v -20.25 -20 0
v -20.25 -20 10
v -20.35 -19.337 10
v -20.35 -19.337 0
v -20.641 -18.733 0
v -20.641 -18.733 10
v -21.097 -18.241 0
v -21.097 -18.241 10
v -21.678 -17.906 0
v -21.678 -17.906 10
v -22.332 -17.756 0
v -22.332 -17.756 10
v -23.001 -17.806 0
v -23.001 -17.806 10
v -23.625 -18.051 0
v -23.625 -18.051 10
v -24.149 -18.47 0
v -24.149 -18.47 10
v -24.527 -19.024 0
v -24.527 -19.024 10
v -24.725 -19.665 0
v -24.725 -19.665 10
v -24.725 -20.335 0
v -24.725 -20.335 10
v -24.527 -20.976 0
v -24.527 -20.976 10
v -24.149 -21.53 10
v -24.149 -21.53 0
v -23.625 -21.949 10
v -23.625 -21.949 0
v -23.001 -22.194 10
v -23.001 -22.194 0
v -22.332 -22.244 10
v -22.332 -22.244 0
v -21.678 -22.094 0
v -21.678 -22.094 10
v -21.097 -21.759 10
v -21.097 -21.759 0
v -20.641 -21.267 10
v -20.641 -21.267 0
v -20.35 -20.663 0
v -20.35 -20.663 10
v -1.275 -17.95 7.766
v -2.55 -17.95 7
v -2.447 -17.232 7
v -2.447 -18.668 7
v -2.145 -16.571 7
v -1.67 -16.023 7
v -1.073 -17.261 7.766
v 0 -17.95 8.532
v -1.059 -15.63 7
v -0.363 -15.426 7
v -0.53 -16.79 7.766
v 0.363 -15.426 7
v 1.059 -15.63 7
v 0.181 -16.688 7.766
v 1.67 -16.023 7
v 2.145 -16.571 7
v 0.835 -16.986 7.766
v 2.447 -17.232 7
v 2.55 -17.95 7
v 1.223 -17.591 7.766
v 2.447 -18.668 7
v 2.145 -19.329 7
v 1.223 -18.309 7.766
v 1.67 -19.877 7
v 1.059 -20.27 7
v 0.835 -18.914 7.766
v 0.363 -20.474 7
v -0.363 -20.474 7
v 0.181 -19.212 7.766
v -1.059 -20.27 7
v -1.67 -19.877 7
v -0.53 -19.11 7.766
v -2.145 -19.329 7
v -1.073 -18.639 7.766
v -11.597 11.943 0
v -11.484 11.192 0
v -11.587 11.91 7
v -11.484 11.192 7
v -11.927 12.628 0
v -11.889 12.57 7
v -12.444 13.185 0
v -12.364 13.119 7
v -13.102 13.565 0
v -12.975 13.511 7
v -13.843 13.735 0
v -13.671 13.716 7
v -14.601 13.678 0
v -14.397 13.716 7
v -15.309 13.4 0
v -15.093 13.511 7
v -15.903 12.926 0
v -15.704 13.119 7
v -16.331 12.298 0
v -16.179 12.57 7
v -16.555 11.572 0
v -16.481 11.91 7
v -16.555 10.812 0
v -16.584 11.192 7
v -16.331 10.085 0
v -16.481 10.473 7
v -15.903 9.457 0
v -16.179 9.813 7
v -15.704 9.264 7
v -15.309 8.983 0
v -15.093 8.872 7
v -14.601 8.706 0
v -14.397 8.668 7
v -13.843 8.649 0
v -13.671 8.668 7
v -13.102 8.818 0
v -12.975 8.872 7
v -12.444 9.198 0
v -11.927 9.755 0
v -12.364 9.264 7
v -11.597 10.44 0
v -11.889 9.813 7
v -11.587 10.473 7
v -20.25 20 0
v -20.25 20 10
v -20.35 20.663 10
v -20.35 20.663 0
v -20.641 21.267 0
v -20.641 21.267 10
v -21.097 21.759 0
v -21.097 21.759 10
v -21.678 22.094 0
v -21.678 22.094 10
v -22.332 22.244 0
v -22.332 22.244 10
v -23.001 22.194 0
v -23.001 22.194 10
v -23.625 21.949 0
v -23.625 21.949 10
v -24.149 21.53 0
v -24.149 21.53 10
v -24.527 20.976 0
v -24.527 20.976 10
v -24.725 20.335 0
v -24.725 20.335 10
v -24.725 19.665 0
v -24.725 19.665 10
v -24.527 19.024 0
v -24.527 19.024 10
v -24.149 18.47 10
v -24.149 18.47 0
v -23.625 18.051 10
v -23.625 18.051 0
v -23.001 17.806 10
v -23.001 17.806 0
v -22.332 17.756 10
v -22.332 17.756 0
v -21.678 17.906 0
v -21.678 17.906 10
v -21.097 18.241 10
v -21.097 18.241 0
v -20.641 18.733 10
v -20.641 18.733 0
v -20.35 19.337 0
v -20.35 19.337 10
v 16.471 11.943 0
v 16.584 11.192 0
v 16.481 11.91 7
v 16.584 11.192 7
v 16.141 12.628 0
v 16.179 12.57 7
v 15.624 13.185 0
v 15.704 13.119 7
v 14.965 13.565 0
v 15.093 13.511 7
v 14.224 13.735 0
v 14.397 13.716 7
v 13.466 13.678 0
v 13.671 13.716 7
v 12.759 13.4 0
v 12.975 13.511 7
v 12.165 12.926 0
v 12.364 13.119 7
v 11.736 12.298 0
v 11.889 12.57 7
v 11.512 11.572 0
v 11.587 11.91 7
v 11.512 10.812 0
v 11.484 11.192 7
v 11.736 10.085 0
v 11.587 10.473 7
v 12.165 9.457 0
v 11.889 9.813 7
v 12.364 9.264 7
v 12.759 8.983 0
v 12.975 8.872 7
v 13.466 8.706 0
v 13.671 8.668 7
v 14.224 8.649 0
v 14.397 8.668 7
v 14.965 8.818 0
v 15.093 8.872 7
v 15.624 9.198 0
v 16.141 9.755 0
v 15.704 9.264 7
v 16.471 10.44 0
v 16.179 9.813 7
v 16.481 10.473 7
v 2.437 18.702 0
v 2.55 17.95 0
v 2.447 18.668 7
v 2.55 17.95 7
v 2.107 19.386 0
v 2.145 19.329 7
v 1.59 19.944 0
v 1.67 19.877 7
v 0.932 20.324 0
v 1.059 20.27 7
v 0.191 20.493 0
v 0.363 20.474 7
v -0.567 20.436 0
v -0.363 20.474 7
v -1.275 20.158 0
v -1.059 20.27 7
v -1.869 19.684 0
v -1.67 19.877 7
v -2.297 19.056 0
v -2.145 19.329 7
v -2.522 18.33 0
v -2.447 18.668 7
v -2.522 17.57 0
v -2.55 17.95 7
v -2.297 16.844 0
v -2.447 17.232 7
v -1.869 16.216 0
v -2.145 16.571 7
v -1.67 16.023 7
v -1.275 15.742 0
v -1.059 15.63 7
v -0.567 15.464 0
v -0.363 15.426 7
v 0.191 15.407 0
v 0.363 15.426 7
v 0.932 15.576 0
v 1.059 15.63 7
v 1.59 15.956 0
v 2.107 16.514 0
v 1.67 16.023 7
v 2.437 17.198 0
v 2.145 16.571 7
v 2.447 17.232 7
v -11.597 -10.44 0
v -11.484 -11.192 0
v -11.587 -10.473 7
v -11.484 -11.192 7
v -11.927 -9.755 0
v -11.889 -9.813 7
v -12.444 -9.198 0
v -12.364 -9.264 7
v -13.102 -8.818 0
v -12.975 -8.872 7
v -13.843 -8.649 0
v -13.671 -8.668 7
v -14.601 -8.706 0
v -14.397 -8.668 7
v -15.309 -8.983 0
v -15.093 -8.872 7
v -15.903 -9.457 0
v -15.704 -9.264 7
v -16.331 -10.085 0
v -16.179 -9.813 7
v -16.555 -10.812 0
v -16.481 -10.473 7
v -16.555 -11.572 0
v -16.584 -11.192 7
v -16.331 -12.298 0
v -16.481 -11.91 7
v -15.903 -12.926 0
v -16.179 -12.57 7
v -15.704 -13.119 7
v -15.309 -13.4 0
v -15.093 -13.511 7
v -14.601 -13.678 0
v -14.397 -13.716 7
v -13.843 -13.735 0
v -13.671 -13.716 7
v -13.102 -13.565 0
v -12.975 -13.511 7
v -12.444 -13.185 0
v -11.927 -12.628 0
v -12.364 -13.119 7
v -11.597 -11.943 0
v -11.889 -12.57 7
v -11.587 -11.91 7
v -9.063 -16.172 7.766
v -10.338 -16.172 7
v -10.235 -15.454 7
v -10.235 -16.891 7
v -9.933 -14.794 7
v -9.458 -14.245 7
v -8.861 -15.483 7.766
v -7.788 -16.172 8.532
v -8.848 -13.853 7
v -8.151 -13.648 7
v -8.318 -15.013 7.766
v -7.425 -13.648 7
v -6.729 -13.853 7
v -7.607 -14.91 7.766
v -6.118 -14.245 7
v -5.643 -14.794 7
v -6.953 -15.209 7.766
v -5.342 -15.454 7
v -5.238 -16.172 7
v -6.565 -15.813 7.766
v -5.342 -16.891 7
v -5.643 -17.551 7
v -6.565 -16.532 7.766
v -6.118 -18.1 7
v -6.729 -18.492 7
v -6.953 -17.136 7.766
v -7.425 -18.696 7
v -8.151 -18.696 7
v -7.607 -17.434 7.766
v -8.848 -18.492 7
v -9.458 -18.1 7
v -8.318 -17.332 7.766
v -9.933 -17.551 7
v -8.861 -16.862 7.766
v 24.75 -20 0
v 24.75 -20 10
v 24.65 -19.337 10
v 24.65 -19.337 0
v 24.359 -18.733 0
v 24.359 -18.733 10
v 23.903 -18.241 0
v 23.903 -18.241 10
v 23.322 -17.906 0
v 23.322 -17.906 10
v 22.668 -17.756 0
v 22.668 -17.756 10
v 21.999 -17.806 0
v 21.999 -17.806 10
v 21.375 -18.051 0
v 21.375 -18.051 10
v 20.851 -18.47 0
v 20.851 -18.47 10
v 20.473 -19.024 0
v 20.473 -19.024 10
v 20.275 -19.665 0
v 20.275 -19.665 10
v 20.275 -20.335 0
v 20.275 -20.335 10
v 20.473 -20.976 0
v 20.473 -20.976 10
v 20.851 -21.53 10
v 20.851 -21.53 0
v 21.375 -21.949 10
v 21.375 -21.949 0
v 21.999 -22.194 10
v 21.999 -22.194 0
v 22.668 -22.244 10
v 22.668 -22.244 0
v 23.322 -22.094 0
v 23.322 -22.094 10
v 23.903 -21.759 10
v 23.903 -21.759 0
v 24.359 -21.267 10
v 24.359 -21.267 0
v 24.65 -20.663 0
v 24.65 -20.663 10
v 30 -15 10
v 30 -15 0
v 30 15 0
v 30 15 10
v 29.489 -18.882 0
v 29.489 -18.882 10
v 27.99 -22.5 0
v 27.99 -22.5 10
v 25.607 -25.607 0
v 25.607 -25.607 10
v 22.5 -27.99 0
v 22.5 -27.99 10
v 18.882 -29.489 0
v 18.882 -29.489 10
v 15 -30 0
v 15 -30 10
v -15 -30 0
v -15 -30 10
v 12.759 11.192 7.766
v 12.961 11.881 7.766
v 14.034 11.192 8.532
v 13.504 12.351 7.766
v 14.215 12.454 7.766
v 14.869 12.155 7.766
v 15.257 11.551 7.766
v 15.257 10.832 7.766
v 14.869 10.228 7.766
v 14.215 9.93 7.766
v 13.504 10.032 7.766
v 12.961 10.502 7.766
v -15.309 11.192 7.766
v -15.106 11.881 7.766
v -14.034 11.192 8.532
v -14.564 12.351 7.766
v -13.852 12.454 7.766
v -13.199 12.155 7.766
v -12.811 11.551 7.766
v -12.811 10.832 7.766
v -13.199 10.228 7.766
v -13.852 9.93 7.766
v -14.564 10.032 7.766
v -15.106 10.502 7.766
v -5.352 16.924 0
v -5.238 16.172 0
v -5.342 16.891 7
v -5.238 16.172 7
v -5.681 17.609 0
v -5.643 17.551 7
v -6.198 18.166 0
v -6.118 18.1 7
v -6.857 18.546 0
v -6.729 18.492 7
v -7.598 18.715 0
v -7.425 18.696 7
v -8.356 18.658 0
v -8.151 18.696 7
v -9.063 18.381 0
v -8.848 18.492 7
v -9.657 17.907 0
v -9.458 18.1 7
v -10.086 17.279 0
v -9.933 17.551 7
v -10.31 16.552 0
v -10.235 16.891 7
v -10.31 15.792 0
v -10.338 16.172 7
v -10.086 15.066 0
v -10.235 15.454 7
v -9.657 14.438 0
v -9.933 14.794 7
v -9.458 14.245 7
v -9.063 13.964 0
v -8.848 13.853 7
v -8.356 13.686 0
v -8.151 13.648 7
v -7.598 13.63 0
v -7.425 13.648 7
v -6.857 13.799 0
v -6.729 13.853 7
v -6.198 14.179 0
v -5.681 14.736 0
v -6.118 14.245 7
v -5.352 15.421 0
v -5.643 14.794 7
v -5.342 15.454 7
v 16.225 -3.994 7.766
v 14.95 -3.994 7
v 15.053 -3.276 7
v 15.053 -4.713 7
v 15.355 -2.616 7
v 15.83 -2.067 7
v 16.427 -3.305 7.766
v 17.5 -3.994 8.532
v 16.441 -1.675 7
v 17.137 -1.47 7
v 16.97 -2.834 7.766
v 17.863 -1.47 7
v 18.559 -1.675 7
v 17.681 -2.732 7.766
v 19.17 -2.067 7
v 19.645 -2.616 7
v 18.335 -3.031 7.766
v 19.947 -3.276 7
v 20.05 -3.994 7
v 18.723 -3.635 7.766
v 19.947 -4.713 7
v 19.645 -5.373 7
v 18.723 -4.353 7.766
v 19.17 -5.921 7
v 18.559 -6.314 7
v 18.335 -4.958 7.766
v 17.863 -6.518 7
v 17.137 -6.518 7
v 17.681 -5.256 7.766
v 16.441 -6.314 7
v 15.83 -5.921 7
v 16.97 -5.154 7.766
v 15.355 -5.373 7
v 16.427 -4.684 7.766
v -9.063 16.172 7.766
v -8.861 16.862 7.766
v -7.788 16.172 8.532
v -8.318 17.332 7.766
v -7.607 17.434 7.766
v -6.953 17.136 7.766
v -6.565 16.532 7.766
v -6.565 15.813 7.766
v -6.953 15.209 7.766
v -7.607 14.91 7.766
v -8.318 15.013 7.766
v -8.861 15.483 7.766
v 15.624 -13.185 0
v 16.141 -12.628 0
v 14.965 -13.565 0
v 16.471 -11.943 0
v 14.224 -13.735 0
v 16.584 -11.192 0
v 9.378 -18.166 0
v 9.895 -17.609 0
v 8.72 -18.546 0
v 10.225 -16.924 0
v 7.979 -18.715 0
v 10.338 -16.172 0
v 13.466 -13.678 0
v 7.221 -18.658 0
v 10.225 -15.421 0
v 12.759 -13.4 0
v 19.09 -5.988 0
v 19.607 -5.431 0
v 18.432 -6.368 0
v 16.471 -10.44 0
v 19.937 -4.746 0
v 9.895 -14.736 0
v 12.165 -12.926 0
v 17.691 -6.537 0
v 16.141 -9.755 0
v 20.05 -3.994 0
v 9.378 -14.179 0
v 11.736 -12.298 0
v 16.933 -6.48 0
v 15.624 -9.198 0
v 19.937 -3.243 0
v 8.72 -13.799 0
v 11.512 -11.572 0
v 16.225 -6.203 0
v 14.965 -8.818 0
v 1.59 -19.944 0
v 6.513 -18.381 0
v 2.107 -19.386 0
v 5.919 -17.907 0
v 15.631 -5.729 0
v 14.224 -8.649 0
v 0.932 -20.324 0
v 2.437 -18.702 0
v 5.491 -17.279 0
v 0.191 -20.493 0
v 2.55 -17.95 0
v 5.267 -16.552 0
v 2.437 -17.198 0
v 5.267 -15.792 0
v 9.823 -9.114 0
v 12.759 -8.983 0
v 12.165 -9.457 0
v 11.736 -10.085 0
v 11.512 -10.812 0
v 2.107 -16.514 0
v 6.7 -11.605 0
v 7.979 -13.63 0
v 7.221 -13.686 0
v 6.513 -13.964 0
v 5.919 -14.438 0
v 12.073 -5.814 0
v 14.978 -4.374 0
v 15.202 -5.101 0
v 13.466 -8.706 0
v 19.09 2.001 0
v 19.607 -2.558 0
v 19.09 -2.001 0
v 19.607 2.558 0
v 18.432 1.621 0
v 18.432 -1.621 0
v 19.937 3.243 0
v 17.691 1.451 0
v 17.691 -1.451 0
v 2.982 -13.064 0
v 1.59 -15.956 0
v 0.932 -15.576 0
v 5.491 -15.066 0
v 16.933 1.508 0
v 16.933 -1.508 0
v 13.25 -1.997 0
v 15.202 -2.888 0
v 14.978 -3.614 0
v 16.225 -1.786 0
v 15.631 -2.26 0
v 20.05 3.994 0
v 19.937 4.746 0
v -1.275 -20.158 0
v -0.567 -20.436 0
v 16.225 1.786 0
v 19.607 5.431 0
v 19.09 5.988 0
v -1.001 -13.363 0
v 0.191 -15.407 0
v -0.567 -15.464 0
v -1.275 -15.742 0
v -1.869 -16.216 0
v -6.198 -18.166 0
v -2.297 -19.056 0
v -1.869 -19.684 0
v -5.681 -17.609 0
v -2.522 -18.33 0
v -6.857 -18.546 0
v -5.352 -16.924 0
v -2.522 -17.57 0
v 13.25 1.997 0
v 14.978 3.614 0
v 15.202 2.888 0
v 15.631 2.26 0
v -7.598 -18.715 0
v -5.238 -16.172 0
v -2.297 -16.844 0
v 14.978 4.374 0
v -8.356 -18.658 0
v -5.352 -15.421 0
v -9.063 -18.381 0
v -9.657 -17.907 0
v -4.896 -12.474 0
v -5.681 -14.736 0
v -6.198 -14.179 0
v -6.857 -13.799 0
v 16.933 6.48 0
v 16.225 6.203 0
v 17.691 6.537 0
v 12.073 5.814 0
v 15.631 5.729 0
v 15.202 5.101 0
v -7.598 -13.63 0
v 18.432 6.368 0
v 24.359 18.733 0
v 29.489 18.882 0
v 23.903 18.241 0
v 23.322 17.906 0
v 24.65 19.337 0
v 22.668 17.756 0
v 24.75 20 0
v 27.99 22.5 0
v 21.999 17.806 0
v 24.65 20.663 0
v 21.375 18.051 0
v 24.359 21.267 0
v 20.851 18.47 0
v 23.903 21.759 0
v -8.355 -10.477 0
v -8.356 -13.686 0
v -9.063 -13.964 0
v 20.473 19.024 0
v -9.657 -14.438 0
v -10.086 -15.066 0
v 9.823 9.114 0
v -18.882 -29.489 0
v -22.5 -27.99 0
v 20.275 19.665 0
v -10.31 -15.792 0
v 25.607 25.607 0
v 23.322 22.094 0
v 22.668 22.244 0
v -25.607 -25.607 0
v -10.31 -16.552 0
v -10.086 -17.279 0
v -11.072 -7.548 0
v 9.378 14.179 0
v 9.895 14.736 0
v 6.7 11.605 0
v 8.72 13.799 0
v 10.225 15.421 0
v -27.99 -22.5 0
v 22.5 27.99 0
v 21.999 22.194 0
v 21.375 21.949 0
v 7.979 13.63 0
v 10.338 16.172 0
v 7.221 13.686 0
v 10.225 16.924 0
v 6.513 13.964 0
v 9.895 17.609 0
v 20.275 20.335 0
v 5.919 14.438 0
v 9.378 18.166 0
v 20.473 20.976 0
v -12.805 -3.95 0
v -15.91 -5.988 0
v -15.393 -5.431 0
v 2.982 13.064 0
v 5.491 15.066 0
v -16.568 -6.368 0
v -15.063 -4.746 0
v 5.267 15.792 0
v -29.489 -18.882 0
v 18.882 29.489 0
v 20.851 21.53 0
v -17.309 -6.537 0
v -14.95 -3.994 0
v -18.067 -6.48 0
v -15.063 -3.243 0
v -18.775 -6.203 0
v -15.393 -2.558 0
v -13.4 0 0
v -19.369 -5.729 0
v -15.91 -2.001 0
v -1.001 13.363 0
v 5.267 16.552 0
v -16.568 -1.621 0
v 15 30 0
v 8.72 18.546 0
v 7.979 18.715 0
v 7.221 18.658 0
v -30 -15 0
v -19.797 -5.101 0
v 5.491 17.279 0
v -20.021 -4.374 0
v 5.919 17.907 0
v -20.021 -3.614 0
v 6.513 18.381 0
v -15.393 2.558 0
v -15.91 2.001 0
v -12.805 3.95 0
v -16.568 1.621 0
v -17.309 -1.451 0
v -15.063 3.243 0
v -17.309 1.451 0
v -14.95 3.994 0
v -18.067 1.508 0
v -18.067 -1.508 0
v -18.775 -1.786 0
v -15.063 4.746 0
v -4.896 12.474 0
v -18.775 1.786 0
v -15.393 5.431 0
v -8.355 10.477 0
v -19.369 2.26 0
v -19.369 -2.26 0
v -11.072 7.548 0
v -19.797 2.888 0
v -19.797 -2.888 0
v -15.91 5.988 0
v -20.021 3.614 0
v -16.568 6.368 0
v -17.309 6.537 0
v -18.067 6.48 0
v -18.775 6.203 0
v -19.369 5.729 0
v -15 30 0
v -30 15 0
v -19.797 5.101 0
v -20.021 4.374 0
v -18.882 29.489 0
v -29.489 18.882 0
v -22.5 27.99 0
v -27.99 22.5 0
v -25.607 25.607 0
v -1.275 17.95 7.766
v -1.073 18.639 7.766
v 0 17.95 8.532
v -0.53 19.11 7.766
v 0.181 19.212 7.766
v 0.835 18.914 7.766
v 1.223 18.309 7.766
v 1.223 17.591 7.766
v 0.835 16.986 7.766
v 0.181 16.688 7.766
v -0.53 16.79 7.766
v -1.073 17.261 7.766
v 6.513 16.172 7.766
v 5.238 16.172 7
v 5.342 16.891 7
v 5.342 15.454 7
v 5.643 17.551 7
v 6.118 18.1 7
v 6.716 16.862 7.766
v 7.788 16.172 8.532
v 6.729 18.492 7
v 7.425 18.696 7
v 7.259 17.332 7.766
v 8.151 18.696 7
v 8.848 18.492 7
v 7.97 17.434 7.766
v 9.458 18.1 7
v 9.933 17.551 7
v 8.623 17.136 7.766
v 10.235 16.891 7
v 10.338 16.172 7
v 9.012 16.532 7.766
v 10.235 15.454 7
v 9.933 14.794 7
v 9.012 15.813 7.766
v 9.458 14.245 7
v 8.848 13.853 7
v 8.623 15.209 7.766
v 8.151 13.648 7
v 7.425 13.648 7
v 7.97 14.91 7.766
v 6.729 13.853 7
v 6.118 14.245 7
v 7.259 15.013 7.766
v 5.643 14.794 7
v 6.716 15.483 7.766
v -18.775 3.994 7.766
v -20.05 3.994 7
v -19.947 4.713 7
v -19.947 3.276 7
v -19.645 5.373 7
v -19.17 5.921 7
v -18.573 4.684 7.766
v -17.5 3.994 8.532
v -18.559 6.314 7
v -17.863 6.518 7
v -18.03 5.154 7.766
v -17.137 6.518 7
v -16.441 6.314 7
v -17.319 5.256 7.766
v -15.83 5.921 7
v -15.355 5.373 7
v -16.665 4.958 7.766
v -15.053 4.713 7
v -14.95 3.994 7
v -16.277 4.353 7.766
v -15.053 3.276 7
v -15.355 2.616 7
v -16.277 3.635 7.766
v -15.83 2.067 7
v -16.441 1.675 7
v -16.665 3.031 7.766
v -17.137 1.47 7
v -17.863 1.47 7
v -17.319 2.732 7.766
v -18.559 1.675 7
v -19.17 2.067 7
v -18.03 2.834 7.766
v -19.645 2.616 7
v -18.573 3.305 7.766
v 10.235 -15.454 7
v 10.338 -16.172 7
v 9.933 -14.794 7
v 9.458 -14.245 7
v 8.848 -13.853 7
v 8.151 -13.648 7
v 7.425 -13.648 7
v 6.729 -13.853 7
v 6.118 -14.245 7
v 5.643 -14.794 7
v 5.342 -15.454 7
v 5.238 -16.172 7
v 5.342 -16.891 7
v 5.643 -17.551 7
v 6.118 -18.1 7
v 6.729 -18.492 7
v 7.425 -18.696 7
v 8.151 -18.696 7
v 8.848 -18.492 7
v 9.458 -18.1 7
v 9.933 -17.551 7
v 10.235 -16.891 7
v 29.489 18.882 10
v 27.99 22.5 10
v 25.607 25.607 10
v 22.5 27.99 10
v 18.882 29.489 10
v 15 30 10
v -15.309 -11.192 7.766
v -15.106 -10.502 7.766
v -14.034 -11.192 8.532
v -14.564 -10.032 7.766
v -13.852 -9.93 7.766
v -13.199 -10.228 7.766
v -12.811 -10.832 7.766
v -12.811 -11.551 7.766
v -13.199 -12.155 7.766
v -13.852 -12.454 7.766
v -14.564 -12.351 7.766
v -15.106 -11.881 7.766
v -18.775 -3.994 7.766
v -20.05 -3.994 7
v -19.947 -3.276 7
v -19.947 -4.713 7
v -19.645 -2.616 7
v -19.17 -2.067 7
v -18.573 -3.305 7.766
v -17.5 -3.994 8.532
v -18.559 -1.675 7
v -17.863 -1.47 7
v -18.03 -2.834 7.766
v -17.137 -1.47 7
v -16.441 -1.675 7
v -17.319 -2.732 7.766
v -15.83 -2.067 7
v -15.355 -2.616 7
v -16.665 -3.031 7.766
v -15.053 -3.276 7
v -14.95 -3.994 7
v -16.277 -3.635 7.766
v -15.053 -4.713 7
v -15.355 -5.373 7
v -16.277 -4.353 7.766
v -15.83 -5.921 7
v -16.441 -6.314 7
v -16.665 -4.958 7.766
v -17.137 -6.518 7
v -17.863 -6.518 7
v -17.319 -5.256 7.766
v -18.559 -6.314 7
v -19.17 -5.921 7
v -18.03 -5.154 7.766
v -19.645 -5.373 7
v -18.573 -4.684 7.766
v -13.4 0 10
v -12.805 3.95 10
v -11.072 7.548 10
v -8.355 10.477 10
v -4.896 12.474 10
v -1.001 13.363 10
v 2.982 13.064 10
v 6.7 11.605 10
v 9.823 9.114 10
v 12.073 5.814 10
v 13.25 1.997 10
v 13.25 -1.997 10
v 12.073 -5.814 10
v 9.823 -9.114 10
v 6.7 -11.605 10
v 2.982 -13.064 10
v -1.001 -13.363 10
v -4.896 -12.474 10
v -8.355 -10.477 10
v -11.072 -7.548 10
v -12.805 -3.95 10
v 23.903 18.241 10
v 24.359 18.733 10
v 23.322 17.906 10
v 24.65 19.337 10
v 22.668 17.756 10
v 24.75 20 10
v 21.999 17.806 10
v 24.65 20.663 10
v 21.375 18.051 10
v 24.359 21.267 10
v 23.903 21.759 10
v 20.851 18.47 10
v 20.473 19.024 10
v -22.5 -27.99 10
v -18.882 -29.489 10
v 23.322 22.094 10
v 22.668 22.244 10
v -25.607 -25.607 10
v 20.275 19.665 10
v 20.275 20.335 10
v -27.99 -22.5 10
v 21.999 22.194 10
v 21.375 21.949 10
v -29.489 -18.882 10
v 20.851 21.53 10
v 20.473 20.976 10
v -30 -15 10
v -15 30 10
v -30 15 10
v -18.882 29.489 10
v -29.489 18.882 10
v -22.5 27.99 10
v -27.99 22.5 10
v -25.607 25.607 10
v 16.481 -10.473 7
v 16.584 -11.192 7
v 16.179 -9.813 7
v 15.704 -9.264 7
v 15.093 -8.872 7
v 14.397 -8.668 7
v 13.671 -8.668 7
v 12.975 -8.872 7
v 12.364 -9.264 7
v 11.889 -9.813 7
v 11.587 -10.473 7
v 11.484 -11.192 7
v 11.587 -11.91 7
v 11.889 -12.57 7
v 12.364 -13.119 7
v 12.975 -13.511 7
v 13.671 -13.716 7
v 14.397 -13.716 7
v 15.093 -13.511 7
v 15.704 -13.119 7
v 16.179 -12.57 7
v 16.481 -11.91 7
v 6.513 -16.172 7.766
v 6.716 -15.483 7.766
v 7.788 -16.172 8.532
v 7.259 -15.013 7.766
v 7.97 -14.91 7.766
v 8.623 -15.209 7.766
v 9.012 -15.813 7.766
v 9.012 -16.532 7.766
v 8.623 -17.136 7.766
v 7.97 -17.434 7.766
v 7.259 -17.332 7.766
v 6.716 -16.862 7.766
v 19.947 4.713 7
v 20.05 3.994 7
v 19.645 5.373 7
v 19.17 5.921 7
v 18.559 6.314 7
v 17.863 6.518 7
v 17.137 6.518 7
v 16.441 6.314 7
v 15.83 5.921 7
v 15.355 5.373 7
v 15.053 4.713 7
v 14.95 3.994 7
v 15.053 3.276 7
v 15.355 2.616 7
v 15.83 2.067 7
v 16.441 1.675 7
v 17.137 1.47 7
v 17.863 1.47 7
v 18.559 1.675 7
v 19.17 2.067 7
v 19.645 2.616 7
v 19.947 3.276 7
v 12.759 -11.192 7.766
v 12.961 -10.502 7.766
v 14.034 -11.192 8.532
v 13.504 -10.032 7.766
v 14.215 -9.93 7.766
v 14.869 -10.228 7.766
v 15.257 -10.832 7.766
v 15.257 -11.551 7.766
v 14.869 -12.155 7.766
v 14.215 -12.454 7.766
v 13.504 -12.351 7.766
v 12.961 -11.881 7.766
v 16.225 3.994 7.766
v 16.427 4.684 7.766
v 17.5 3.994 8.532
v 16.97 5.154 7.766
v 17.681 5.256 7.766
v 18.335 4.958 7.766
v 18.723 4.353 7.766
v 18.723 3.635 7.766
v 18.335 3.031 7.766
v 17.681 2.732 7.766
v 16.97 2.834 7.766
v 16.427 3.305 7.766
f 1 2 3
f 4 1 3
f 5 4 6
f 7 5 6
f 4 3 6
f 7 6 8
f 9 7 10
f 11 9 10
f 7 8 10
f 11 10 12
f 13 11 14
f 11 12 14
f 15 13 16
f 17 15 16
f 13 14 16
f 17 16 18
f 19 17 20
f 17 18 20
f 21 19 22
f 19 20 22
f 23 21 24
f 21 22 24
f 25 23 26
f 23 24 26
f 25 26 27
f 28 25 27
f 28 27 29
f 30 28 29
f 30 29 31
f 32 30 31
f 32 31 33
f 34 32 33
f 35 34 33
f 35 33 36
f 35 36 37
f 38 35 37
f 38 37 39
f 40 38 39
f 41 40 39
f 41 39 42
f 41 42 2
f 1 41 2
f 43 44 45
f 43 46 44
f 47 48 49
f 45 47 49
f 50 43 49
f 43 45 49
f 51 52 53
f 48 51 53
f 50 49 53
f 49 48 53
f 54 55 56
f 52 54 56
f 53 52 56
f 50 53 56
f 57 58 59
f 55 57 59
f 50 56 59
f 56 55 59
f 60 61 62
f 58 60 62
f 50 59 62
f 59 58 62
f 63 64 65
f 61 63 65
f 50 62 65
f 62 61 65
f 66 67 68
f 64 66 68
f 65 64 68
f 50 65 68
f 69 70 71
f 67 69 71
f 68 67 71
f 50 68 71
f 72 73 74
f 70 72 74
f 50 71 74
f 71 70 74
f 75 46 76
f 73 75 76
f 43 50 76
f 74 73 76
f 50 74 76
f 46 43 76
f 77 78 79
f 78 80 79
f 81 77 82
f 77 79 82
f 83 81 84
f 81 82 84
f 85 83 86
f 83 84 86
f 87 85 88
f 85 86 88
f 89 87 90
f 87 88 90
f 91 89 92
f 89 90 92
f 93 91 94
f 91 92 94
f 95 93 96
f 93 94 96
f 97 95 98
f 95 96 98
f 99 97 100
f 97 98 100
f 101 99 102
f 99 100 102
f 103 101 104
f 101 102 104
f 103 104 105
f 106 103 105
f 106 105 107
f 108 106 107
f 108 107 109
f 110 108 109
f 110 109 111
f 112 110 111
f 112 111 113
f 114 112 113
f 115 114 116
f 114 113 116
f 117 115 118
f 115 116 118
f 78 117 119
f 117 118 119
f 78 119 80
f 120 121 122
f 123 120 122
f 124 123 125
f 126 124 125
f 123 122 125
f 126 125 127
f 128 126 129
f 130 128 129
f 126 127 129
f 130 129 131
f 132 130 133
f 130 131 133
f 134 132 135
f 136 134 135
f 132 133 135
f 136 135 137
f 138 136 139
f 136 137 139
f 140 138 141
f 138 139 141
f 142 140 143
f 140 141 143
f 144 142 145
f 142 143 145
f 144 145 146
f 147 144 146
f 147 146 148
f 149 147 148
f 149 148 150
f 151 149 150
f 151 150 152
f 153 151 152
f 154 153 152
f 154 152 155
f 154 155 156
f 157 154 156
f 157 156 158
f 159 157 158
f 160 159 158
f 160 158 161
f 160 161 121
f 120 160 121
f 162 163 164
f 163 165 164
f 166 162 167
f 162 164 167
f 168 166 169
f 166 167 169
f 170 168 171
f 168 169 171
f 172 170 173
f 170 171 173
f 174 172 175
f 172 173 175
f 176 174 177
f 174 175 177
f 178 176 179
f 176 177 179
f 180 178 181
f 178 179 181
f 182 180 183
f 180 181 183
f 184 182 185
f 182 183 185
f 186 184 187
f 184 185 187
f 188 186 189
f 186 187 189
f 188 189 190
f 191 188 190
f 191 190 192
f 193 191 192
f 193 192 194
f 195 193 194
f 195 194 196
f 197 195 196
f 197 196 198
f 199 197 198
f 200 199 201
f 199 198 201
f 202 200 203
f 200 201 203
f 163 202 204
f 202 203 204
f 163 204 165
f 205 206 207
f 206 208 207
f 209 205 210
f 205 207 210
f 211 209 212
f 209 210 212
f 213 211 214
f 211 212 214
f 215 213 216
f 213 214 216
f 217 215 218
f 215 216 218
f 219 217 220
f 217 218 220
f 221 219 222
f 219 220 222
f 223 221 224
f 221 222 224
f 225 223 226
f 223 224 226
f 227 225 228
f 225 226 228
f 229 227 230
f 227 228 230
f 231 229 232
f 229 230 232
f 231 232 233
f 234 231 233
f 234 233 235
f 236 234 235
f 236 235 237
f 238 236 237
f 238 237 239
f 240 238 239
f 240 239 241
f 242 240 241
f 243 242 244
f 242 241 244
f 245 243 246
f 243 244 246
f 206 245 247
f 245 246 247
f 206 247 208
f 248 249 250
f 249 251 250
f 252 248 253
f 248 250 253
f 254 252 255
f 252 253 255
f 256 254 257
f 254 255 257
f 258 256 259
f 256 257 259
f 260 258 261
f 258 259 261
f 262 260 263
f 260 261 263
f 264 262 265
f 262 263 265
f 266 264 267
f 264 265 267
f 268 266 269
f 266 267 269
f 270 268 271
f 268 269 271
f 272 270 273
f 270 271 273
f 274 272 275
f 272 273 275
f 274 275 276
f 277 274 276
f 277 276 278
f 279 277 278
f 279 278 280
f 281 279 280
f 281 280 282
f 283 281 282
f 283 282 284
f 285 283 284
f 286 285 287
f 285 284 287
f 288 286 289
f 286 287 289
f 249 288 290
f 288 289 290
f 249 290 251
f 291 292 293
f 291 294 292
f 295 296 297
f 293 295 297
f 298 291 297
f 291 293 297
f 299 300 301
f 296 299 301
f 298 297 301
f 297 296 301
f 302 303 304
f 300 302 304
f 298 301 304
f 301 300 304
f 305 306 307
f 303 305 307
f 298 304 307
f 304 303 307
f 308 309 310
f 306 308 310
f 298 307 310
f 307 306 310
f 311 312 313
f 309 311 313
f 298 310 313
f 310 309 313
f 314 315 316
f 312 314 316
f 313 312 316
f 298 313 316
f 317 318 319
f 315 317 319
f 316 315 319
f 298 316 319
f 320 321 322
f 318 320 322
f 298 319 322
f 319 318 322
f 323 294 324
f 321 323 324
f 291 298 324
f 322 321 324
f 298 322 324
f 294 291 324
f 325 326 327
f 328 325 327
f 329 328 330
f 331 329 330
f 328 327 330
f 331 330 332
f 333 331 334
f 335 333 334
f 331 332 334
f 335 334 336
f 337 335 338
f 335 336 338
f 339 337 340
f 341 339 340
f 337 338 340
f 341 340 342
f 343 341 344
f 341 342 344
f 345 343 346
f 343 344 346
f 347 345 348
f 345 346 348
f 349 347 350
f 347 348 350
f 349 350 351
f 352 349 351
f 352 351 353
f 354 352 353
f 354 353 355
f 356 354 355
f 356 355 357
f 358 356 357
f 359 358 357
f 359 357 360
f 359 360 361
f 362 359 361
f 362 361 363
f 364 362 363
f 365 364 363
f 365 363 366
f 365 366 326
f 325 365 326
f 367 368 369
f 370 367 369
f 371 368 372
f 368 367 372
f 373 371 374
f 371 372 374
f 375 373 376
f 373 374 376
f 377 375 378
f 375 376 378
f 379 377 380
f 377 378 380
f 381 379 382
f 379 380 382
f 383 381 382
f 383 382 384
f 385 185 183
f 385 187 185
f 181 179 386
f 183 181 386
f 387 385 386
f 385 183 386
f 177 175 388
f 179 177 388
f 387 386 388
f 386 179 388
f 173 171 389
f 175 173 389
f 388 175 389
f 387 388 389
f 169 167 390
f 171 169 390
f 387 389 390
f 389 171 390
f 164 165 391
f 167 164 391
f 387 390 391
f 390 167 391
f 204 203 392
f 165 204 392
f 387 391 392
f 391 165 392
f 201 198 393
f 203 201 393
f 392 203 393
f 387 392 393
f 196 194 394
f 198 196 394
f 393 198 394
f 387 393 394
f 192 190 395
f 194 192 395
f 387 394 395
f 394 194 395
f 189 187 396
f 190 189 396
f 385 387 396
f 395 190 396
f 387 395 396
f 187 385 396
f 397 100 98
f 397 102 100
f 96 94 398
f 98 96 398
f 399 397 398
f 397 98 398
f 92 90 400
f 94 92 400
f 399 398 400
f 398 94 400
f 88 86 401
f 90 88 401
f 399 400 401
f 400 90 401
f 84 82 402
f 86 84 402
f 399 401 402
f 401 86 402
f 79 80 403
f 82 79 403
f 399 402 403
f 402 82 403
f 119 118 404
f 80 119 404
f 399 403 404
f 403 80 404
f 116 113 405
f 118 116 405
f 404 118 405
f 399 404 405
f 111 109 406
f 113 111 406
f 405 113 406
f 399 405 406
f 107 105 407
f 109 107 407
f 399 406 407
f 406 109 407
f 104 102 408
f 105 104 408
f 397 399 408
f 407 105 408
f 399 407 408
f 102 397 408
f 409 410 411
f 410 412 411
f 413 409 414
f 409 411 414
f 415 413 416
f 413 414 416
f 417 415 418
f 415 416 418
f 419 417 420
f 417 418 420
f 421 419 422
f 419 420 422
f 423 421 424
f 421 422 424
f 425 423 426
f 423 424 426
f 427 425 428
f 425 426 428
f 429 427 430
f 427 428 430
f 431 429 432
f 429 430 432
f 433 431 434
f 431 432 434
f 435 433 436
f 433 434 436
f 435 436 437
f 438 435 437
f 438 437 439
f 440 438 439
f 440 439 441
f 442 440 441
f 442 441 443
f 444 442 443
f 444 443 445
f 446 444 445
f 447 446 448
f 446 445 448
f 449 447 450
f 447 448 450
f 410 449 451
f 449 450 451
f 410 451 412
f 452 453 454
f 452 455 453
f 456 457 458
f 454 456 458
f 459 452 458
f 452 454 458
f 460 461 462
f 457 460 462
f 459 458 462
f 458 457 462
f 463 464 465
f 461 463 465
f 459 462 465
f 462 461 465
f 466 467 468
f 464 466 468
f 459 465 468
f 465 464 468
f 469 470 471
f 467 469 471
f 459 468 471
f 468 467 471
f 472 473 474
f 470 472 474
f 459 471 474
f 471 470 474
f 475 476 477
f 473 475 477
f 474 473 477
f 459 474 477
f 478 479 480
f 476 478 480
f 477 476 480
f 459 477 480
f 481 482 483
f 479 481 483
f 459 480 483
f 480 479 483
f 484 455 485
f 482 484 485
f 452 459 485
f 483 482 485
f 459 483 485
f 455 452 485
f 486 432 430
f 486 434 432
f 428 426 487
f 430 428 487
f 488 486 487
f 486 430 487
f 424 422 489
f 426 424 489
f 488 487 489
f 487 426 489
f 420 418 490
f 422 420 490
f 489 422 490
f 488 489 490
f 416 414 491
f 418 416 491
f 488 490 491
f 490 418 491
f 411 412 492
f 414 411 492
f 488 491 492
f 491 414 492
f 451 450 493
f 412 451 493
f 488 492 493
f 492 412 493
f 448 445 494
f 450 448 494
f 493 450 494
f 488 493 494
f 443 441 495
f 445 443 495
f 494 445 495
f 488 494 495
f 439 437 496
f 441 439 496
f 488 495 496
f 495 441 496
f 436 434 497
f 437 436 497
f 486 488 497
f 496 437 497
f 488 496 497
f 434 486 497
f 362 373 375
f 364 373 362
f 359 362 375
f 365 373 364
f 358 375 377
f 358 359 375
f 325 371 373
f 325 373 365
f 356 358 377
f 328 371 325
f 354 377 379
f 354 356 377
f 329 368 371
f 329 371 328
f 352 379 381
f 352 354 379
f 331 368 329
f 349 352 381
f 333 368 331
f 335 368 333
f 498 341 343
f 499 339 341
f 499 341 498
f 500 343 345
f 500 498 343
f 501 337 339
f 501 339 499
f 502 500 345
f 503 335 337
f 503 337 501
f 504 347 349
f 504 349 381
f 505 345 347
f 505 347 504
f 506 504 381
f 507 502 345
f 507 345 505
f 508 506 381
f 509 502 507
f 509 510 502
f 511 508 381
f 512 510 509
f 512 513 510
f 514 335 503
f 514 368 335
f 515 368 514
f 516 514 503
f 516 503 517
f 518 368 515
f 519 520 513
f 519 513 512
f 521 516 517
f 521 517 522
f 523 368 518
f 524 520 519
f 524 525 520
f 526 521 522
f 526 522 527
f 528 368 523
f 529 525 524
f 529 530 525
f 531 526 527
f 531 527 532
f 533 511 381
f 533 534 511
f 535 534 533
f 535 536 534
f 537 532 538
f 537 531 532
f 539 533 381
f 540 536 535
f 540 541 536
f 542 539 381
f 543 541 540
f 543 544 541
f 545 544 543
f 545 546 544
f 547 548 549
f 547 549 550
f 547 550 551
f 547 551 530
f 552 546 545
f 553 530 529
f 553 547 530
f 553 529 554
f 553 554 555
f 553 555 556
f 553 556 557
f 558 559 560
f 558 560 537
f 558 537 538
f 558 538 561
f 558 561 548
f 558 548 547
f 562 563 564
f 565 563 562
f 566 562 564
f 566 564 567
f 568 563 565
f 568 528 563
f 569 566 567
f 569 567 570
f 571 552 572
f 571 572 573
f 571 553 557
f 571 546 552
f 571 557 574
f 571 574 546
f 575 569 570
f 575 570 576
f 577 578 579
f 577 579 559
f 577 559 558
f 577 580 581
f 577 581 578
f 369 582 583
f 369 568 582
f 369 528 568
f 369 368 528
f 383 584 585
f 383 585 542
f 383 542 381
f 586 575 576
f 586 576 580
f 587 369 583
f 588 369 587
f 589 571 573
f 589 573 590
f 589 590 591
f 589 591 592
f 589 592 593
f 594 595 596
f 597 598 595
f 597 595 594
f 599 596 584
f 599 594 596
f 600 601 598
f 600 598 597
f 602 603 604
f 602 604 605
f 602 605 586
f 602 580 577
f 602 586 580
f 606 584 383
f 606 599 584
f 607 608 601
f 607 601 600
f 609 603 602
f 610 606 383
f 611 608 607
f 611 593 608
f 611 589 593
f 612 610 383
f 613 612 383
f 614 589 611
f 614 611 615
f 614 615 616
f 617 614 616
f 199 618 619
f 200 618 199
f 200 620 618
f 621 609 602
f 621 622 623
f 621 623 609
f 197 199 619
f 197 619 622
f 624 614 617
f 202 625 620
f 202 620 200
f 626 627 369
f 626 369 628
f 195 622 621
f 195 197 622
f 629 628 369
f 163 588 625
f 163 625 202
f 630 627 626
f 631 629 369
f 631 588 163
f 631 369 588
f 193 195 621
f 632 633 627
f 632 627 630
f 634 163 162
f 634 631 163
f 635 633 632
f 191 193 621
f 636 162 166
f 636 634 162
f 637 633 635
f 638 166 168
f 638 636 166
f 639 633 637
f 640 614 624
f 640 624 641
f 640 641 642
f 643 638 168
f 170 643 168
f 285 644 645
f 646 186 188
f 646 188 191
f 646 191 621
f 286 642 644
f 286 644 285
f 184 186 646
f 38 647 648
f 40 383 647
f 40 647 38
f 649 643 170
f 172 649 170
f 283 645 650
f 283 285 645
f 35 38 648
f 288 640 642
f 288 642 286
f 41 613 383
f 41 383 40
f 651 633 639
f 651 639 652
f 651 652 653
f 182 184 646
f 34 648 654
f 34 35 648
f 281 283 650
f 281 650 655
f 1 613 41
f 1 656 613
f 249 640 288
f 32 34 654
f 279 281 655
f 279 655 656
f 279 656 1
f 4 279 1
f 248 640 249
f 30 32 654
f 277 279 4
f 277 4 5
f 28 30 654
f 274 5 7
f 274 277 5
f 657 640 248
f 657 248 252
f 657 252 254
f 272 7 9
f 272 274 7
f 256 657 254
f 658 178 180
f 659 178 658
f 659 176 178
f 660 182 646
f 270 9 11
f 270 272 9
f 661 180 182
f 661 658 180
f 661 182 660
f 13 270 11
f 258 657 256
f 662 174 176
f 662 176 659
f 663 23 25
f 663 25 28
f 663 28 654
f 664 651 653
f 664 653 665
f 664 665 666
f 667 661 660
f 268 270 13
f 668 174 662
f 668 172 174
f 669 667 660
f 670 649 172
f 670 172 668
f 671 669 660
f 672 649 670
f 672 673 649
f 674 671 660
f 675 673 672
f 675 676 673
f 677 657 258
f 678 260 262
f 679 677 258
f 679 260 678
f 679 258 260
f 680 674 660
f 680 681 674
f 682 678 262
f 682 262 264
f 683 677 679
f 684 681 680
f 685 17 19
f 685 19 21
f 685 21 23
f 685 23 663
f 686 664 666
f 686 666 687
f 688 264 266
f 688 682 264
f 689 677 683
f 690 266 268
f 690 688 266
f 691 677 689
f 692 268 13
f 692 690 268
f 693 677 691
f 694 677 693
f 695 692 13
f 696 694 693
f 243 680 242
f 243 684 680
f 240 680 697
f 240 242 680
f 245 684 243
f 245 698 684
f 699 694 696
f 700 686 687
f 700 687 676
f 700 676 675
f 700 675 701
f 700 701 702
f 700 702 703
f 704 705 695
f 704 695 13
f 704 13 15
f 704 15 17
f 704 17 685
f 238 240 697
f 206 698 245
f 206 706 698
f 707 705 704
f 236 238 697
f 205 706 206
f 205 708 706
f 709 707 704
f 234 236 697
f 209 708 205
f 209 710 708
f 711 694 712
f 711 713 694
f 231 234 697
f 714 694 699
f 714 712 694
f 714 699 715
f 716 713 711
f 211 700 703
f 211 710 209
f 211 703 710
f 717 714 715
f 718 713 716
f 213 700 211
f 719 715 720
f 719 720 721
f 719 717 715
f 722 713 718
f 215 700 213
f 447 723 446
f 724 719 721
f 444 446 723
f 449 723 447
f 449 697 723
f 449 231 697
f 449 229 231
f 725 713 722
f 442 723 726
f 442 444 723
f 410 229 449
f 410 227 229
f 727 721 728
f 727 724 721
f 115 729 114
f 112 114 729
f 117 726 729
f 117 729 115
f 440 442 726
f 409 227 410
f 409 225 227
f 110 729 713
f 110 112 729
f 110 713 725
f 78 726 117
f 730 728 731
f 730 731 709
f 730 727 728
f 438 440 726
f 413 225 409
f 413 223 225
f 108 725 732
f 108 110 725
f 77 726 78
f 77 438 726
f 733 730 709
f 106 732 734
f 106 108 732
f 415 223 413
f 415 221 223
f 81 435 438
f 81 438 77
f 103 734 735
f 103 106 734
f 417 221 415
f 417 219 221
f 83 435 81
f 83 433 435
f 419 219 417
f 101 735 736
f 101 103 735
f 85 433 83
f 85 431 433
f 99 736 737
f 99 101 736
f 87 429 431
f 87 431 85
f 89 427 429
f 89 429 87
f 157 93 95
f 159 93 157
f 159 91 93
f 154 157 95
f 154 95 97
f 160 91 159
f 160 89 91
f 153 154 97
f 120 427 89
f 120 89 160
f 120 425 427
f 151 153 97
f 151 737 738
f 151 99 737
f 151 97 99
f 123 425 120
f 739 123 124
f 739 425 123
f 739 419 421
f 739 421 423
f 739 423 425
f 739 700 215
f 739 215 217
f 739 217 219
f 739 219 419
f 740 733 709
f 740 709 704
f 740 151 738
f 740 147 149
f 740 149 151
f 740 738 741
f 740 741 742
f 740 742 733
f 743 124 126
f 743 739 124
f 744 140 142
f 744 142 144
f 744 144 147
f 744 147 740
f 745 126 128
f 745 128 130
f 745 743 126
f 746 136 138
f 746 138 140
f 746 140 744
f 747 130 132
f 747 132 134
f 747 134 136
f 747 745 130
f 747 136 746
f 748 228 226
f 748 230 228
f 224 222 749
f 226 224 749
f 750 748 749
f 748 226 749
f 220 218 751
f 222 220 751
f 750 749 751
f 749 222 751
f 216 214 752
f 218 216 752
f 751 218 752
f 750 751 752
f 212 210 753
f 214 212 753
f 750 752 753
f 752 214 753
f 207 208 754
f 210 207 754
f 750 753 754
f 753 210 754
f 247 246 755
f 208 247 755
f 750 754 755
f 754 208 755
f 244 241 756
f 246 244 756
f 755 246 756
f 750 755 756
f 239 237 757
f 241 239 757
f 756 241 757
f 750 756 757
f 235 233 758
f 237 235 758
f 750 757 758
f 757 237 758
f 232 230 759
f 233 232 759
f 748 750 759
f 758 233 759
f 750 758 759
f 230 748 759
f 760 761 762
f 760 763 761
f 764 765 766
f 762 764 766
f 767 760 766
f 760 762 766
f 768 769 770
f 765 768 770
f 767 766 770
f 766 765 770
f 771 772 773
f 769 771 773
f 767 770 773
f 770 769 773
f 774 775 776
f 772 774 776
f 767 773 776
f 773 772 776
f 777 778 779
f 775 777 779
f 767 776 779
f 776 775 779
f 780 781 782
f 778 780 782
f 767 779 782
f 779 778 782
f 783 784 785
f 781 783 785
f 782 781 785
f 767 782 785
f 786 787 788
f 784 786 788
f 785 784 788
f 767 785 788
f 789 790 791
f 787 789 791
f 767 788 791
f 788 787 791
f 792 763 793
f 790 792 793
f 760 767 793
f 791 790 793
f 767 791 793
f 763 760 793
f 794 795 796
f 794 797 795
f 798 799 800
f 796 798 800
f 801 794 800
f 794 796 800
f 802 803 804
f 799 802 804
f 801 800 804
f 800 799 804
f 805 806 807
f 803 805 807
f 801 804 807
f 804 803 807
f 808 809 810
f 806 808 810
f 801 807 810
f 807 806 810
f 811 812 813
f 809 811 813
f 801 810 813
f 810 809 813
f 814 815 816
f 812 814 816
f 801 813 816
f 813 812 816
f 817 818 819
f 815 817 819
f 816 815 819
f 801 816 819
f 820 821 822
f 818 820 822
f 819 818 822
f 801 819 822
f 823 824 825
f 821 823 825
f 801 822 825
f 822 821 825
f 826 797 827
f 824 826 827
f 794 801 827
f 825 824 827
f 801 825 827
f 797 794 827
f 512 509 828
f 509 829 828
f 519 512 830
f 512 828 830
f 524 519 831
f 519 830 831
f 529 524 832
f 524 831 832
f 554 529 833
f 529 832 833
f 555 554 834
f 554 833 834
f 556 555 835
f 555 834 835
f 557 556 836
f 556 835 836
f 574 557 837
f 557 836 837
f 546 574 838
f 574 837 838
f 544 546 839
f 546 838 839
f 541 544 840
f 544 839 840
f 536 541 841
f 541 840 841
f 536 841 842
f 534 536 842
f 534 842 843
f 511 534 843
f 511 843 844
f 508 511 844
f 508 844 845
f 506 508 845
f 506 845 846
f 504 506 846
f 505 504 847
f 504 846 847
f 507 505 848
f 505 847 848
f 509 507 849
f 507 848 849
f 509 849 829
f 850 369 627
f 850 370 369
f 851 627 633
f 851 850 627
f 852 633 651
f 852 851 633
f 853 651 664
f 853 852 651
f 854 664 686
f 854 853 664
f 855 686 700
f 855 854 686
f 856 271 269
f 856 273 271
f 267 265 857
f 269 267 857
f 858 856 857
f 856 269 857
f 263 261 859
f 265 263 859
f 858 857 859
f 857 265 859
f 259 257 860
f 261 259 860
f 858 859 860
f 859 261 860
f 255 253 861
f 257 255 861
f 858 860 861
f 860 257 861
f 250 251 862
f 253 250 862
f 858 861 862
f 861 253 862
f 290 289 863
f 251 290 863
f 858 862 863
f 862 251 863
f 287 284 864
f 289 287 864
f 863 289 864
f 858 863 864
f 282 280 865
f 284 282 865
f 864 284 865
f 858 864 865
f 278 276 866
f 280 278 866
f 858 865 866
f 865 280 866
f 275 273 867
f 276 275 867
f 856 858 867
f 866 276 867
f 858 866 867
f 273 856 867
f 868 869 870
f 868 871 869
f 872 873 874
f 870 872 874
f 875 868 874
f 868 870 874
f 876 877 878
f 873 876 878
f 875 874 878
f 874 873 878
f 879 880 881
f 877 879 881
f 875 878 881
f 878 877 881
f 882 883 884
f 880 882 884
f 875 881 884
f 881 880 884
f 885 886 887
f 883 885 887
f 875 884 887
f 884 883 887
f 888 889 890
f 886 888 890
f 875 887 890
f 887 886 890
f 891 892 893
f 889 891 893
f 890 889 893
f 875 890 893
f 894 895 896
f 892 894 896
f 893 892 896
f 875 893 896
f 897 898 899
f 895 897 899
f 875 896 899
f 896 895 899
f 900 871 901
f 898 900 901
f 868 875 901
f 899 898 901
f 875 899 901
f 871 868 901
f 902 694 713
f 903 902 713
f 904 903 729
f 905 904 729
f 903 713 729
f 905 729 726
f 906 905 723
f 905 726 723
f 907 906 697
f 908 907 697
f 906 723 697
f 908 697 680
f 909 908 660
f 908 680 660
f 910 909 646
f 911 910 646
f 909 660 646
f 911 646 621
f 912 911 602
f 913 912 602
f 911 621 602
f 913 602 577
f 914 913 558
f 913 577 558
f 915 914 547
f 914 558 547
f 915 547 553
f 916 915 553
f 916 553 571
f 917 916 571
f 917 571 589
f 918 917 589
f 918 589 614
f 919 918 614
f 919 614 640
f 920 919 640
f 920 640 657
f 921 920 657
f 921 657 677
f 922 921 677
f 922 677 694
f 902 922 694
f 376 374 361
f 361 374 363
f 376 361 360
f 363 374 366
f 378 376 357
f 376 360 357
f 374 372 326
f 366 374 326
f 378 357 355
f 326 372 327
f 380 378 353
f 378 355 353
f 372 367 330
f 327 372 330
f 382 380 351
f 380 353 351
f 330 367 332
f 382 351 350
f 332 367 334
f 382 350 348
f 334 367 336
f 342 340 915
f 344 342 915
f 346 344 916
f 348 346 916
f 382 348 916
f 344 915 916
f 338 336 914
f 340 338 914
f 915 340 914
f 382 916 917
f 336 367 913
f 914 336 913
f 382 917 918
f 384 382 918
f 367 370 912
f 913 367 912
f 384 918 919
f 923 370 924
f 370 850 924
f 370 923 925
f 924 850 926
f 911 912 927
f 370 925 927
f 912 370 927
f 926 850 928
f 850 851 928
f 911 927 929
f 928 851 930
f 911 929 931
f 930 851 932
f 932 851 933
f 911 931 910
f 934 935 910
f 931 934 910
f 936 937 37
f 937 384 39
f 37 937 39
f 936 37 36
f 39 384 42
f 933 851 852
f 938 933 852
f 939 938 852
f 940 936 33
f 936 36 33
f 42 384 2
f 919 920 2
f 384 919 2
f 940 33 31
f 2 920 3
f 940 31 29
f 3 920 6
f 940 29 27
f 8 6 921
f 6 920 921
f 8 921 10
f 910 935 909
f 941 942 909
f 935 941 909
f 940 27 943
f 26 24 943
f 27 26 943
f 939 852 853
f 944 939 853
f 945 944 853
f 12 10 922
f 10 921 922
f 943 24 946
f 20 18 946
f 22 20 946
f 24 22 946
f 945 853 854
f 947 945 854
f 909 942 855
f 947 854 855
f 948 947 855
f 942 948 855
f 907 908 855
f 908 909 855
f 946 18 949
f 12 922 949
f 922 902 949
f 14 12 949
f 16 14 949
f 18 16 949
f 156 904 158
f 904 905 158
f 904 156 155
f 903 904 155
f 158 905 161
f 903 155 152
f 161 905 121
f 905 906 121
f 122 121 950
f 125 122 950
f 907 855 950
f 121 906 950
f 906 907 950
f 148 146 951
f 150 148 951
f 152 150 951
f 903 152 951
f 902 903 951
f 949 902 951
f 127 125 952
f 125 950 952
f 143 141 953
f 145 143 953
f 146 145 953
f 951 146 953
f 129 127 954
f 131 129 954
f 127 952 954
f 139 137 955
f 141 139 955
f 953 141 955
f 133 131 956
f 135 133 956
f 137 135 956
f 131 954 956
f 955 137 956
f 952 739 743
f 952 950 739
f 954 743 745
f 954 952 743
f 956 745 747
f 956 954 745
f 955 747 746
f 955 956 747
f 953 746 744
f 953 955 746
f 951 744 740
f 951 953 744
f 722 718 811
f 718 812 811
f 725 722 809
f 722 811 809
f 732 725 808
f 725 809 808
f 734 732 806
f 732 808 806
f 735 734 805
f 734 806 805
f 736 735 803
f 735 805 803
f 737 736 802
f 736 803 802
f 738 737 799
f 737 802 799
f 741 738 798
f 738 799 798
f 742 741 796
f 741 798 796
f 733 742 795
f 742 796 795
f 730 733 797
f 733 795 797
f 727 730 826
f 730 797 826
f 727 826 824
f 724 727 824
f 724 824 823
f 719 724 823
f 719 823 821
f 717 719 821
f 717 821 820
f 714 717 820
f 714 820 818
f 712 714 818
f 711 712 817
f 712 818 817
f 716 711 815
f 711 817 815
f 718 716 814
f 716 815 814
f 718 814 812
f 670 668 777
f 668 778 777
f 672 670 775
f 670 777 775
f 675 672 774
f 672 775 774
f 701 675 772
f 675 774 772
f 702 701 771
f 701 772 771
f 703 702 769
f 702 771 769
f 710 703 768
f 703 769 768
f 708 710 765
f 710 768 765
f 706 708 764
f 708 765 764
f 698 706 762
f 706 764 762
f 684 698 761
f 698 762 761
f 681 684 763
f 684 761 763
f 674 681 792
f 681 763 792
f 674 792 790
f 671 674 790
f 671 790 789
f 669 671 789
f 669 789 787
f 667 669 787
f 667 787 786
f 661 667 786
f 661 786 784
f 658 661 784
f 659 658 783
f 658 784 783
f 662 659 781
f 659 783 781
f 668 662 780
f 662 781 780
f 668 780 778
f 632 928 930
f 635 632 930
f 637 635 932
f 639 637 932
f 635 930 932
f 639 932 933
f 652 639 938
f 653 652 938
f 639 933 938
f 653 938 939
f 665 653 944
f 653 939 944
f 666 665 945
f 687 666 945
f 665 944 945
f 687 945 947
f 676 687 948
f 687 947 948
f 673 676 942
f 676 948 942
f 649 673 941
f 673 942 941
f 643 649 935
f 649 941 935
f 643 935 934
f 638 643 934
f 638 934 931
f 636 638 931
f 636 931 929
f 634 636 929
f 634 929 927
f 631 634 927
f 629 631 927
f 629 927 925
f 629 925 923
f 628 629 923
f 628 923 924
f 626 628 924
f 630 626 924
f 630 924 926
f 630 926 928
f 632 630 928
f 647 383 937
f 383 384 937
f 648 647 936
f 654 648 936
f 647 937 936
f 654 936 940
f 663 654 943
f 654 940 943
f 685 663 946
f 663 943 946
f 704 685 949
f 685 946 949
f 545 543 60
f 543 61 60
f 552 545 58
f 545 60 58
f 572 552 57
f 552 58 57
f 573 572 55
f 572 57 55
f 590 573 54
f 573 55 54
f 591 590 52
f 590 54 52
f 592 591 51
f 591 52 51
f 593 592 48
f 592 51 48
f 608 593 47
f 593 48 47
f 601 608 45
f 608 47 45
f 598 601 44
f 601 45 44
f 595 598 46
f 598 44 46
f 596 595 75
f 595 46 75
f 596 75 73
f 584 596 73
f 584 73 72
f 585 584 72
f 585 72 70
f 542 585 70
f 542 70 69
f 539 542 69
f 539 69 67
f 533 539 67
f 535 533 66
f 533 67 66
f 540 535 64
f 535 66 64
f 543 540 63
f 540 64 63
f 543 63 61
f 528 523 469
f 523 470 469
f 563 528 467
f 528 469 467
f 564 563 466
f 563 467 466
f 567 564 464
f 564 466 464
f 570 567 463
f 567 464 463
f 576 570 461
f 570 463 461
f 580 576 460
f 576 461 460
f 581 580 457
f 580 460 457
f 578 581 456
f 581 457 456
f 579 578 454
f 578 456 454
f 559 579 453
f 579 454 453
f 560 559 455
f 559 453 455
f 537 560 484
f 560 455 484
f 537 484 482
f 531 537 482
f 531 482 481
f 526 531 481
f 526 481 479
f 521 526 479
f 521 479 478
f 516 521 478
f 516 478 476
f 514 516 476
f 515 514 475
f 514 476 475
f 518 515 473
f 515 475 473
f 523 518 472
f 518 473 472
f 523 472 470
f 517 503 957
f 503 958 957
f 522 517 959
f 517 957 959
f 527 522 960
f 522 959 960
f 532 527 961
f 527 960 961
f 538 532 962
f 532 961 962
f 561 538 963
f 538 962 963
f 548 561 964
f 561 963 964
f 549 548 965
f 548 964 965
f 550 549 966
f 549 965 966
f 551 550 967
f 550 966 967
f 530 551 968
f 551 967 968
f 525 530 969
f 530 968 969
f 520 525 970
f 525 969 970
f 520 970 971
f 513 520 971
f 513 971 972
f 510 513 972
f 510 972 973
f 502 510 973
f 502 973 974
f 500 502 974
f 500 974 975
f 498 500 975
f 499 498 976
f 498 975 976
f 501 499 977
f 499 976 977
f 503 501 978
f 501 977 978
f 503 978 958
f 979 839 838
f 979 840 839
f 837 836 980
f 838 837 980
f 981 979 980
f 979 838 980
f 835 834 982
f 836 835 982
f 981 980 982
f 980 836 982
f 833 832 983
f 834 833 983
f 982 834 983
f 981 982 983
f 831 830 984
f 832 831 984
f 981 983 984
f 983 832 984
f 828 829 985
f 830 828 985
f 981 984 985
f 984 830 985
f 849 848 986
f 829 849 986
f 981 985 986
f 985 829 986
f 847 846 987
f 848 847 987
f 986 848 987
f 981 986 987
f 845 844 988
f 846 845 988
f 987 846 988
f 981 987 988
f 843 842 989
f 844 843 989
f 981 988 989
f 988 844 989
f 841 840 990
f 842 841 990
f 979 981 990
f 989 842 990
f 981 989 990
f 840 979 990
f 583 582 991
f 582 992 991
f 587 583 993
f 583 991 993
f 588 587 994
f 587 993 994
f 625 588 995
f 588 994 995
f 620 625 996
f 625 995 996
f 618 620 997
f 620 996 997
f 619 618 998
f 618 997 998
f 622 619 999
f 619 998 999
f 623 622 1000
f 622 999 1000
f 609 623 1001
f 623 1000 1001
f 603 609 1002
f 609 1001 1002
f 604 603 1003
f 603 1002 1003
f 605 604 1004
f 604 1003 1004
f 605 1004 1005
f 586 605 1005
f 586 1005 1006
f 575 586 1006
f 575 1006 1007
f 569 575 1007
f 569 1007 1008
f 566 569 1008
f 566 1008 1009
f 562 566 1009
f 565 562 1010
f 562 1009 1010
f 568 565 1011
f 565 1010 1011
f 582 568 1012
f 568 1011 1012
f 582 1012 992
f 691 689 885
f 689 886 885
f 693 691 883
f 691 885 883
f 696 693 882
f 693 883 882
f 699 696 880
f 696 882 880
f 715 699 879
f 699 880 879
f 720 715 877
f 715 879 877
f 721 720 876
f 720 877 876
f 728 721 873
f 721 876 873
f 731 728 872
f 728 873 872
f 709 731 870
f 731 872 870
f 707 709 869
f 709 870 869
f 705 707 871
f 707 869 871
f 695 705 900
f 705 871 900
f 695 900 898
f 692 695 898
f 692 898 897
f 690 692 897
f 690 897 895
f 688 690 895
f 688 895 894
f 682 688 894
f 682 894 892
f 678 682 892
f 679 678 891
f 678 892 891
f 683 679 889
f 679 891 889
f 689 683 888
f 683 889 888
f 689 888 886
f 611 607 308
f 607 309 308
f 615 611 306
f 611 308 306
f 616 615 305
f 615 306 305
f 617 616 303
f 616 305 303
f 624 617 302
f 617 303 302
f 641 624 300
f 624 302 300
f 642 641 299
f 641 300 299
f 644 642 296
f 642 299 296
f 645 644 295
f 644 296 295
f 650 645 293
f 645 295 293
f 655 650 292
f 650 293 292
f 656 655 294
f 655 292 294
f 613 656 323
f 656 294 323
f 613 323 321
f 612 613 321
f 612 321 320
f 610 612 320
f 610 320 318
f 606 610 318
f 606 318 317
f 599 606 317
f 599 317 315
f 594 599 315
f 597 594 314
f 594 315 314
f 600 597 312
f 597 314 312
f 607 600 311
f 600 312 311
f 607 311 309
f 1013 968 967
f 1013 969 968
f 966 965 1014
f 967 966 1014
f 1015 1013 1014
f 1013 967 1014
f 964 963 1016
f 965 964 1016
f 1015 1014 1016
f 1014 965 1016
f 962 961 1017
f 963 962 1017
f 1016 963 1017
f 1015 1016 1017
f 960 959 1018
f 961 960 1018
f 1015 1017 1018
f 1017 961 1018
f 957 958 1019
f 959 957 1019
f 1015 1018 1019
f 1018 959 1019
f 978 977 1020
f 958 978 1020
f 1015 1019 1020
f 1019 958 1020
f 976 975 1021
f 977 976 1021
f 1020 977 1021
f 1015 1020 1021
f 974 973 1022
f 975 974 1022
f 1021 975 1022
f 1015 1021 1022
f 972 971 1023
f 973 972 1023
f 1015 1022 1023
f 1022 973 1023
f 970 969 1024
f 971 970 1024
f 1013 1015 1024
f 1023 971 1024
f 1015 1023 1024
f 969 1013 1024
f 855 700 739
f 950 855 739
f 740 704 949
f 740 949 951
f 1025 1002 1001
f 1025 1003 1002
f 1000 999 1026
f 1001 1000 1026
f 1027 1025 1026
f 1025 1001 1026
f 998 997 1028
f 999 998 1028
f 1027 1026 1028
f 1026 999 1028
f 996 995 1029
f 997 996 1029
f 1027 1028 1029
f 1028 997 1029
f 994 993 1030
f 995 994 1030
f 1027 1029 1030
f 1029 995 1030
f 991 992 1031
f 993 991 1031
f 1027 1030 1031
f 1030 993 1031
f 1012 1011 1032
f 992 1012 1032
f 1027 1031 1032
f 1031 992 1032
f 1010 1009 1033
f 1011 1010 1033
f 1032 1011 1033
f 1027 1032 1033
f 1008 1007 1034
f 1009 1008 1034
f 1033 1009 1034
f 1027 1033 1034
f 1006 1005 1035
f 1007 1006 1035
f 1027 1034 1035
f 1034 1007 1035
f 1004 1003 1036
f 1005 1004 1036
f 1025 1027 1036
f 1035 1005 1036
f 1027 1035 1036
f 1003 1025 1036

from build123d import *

# Parameters (mm, degrees)
ESQUISSE1_W                         = 60
ESQUISSE1_H                         = 60
BOSS_EXTRU_1_DEPTH                  = 10
DIAM_TRE_DU_PER_AGE_4_5_4_5_1_D     = 4.5
DIAM_TRE_DU_PER_AGE_5_1_5_1_1_D     = 5.1
DIAM_TRE_DU_PER_AGE_5_1_5_1_1_DEPTH = 7
DIAM_TRE_DU_PER_AGE_5_1_5_1_1_TIP   = 1.532194579
ESQUISSE9_R                         = 13.4
ENL_V_MAT_EXTRU_2_DEPTH             = 44.588989435
CONG_3_R                            = 15


with BuildPart() as part:
    # Esquisse1 → Boss.-Extru.1 (new body)
    with BuildSketch(Plane(origin=(0, 0, 0), x_dir=(-1, 0, 0), z_dir=(0, 0, -1))):
        Rectangle(ESQUISSE1_W, ESQUISSE1_H)
    extrude(amount=-BOSS_EXTRU_1_DEPTH)

    # Diamètre du perçage Ø4.5 (4.5)1 (through all)
    with Locations(Plane(origin=(0, 0, 0), x_dir=(-1, 0, 0), z_dir=(0, 0, -1))):
        with Locations((22.5, 20), (-22.5, 20), (-22.5, -20), (22.5, -20)):
            Hole(DIAM_TRE_DU_PER_AGE_4_5_4_5_1_D / 2)

    # Diamètre du perçage Ø5.1 (5.1)1
    with Locations(Plane(origin=(0, 0, 0), x_dir=(-1, 0, 0), z_dir=(0, 0, -1))):
        with Locations((-14.03387511, 11.191641943), (-7.788213117, 16.172391179), (0, 17.95), (7.788213117, 16.172391179), (14.03387511, 11.191641943), (17.499956024, 3.994250765), (17.499956024, -3.994250765), (14.03387511, -11.191641943), (7.788213117, -16.172391179), (0, -17.95), (-7.788213117, -16.172391179), (-14.03387511, -11.191641943), (-17.499956024, -3.994250765), (-17.499956024, 3.994250765)):
            Hole(DIAM_TRE_DU_PER_AGE_5_1_5_1_1_D / 2, depth=DIAM_TRE_DU_PER_AGE_5_1_5_1_1_DEPTH)
            with Locations((0, 0, -(DIAM_TRE_DU_PER_AGE_5_1_5_1_1_DEPTH + DIAM_TRE_DU_PER_AGE_5_1_5_1_1_TIP / 2))):  # 118° drill point
                Cone(0, DIAM_TRE_DU_PER_AGE_5_1_5_1_1_D / 2, DIAM_TRE_DU_PER_AGE_5_1_5_1_1_TIP, mode=Mode.SUBTRACT)

    # Esquisse9 → Enlèv. mat.-Extru.2 (cut, through all)
    with BuildSketch(Plane(origin=(0, 0, 0), x_dir=(-1, 0, 0), z_dir=(0, 0, -1))):
        Circle(ESQUISSE9_R)
    extrude(amount=-ENL_V_MAT_EXTRU_2_DEPTH, mode=Mode.SUBTRACT)

    # Congé3
    cong_3_edges = [part.edges().sort_by_distance(p)[0] for p in [
        (30, 30, 5),
        (-30, 30, 5),
        (-30, -30, 5),
        (30, -30, 5),
    ]]
    fillet(cong_3_edges, radius=CONG_3_R)


solid = part.part
